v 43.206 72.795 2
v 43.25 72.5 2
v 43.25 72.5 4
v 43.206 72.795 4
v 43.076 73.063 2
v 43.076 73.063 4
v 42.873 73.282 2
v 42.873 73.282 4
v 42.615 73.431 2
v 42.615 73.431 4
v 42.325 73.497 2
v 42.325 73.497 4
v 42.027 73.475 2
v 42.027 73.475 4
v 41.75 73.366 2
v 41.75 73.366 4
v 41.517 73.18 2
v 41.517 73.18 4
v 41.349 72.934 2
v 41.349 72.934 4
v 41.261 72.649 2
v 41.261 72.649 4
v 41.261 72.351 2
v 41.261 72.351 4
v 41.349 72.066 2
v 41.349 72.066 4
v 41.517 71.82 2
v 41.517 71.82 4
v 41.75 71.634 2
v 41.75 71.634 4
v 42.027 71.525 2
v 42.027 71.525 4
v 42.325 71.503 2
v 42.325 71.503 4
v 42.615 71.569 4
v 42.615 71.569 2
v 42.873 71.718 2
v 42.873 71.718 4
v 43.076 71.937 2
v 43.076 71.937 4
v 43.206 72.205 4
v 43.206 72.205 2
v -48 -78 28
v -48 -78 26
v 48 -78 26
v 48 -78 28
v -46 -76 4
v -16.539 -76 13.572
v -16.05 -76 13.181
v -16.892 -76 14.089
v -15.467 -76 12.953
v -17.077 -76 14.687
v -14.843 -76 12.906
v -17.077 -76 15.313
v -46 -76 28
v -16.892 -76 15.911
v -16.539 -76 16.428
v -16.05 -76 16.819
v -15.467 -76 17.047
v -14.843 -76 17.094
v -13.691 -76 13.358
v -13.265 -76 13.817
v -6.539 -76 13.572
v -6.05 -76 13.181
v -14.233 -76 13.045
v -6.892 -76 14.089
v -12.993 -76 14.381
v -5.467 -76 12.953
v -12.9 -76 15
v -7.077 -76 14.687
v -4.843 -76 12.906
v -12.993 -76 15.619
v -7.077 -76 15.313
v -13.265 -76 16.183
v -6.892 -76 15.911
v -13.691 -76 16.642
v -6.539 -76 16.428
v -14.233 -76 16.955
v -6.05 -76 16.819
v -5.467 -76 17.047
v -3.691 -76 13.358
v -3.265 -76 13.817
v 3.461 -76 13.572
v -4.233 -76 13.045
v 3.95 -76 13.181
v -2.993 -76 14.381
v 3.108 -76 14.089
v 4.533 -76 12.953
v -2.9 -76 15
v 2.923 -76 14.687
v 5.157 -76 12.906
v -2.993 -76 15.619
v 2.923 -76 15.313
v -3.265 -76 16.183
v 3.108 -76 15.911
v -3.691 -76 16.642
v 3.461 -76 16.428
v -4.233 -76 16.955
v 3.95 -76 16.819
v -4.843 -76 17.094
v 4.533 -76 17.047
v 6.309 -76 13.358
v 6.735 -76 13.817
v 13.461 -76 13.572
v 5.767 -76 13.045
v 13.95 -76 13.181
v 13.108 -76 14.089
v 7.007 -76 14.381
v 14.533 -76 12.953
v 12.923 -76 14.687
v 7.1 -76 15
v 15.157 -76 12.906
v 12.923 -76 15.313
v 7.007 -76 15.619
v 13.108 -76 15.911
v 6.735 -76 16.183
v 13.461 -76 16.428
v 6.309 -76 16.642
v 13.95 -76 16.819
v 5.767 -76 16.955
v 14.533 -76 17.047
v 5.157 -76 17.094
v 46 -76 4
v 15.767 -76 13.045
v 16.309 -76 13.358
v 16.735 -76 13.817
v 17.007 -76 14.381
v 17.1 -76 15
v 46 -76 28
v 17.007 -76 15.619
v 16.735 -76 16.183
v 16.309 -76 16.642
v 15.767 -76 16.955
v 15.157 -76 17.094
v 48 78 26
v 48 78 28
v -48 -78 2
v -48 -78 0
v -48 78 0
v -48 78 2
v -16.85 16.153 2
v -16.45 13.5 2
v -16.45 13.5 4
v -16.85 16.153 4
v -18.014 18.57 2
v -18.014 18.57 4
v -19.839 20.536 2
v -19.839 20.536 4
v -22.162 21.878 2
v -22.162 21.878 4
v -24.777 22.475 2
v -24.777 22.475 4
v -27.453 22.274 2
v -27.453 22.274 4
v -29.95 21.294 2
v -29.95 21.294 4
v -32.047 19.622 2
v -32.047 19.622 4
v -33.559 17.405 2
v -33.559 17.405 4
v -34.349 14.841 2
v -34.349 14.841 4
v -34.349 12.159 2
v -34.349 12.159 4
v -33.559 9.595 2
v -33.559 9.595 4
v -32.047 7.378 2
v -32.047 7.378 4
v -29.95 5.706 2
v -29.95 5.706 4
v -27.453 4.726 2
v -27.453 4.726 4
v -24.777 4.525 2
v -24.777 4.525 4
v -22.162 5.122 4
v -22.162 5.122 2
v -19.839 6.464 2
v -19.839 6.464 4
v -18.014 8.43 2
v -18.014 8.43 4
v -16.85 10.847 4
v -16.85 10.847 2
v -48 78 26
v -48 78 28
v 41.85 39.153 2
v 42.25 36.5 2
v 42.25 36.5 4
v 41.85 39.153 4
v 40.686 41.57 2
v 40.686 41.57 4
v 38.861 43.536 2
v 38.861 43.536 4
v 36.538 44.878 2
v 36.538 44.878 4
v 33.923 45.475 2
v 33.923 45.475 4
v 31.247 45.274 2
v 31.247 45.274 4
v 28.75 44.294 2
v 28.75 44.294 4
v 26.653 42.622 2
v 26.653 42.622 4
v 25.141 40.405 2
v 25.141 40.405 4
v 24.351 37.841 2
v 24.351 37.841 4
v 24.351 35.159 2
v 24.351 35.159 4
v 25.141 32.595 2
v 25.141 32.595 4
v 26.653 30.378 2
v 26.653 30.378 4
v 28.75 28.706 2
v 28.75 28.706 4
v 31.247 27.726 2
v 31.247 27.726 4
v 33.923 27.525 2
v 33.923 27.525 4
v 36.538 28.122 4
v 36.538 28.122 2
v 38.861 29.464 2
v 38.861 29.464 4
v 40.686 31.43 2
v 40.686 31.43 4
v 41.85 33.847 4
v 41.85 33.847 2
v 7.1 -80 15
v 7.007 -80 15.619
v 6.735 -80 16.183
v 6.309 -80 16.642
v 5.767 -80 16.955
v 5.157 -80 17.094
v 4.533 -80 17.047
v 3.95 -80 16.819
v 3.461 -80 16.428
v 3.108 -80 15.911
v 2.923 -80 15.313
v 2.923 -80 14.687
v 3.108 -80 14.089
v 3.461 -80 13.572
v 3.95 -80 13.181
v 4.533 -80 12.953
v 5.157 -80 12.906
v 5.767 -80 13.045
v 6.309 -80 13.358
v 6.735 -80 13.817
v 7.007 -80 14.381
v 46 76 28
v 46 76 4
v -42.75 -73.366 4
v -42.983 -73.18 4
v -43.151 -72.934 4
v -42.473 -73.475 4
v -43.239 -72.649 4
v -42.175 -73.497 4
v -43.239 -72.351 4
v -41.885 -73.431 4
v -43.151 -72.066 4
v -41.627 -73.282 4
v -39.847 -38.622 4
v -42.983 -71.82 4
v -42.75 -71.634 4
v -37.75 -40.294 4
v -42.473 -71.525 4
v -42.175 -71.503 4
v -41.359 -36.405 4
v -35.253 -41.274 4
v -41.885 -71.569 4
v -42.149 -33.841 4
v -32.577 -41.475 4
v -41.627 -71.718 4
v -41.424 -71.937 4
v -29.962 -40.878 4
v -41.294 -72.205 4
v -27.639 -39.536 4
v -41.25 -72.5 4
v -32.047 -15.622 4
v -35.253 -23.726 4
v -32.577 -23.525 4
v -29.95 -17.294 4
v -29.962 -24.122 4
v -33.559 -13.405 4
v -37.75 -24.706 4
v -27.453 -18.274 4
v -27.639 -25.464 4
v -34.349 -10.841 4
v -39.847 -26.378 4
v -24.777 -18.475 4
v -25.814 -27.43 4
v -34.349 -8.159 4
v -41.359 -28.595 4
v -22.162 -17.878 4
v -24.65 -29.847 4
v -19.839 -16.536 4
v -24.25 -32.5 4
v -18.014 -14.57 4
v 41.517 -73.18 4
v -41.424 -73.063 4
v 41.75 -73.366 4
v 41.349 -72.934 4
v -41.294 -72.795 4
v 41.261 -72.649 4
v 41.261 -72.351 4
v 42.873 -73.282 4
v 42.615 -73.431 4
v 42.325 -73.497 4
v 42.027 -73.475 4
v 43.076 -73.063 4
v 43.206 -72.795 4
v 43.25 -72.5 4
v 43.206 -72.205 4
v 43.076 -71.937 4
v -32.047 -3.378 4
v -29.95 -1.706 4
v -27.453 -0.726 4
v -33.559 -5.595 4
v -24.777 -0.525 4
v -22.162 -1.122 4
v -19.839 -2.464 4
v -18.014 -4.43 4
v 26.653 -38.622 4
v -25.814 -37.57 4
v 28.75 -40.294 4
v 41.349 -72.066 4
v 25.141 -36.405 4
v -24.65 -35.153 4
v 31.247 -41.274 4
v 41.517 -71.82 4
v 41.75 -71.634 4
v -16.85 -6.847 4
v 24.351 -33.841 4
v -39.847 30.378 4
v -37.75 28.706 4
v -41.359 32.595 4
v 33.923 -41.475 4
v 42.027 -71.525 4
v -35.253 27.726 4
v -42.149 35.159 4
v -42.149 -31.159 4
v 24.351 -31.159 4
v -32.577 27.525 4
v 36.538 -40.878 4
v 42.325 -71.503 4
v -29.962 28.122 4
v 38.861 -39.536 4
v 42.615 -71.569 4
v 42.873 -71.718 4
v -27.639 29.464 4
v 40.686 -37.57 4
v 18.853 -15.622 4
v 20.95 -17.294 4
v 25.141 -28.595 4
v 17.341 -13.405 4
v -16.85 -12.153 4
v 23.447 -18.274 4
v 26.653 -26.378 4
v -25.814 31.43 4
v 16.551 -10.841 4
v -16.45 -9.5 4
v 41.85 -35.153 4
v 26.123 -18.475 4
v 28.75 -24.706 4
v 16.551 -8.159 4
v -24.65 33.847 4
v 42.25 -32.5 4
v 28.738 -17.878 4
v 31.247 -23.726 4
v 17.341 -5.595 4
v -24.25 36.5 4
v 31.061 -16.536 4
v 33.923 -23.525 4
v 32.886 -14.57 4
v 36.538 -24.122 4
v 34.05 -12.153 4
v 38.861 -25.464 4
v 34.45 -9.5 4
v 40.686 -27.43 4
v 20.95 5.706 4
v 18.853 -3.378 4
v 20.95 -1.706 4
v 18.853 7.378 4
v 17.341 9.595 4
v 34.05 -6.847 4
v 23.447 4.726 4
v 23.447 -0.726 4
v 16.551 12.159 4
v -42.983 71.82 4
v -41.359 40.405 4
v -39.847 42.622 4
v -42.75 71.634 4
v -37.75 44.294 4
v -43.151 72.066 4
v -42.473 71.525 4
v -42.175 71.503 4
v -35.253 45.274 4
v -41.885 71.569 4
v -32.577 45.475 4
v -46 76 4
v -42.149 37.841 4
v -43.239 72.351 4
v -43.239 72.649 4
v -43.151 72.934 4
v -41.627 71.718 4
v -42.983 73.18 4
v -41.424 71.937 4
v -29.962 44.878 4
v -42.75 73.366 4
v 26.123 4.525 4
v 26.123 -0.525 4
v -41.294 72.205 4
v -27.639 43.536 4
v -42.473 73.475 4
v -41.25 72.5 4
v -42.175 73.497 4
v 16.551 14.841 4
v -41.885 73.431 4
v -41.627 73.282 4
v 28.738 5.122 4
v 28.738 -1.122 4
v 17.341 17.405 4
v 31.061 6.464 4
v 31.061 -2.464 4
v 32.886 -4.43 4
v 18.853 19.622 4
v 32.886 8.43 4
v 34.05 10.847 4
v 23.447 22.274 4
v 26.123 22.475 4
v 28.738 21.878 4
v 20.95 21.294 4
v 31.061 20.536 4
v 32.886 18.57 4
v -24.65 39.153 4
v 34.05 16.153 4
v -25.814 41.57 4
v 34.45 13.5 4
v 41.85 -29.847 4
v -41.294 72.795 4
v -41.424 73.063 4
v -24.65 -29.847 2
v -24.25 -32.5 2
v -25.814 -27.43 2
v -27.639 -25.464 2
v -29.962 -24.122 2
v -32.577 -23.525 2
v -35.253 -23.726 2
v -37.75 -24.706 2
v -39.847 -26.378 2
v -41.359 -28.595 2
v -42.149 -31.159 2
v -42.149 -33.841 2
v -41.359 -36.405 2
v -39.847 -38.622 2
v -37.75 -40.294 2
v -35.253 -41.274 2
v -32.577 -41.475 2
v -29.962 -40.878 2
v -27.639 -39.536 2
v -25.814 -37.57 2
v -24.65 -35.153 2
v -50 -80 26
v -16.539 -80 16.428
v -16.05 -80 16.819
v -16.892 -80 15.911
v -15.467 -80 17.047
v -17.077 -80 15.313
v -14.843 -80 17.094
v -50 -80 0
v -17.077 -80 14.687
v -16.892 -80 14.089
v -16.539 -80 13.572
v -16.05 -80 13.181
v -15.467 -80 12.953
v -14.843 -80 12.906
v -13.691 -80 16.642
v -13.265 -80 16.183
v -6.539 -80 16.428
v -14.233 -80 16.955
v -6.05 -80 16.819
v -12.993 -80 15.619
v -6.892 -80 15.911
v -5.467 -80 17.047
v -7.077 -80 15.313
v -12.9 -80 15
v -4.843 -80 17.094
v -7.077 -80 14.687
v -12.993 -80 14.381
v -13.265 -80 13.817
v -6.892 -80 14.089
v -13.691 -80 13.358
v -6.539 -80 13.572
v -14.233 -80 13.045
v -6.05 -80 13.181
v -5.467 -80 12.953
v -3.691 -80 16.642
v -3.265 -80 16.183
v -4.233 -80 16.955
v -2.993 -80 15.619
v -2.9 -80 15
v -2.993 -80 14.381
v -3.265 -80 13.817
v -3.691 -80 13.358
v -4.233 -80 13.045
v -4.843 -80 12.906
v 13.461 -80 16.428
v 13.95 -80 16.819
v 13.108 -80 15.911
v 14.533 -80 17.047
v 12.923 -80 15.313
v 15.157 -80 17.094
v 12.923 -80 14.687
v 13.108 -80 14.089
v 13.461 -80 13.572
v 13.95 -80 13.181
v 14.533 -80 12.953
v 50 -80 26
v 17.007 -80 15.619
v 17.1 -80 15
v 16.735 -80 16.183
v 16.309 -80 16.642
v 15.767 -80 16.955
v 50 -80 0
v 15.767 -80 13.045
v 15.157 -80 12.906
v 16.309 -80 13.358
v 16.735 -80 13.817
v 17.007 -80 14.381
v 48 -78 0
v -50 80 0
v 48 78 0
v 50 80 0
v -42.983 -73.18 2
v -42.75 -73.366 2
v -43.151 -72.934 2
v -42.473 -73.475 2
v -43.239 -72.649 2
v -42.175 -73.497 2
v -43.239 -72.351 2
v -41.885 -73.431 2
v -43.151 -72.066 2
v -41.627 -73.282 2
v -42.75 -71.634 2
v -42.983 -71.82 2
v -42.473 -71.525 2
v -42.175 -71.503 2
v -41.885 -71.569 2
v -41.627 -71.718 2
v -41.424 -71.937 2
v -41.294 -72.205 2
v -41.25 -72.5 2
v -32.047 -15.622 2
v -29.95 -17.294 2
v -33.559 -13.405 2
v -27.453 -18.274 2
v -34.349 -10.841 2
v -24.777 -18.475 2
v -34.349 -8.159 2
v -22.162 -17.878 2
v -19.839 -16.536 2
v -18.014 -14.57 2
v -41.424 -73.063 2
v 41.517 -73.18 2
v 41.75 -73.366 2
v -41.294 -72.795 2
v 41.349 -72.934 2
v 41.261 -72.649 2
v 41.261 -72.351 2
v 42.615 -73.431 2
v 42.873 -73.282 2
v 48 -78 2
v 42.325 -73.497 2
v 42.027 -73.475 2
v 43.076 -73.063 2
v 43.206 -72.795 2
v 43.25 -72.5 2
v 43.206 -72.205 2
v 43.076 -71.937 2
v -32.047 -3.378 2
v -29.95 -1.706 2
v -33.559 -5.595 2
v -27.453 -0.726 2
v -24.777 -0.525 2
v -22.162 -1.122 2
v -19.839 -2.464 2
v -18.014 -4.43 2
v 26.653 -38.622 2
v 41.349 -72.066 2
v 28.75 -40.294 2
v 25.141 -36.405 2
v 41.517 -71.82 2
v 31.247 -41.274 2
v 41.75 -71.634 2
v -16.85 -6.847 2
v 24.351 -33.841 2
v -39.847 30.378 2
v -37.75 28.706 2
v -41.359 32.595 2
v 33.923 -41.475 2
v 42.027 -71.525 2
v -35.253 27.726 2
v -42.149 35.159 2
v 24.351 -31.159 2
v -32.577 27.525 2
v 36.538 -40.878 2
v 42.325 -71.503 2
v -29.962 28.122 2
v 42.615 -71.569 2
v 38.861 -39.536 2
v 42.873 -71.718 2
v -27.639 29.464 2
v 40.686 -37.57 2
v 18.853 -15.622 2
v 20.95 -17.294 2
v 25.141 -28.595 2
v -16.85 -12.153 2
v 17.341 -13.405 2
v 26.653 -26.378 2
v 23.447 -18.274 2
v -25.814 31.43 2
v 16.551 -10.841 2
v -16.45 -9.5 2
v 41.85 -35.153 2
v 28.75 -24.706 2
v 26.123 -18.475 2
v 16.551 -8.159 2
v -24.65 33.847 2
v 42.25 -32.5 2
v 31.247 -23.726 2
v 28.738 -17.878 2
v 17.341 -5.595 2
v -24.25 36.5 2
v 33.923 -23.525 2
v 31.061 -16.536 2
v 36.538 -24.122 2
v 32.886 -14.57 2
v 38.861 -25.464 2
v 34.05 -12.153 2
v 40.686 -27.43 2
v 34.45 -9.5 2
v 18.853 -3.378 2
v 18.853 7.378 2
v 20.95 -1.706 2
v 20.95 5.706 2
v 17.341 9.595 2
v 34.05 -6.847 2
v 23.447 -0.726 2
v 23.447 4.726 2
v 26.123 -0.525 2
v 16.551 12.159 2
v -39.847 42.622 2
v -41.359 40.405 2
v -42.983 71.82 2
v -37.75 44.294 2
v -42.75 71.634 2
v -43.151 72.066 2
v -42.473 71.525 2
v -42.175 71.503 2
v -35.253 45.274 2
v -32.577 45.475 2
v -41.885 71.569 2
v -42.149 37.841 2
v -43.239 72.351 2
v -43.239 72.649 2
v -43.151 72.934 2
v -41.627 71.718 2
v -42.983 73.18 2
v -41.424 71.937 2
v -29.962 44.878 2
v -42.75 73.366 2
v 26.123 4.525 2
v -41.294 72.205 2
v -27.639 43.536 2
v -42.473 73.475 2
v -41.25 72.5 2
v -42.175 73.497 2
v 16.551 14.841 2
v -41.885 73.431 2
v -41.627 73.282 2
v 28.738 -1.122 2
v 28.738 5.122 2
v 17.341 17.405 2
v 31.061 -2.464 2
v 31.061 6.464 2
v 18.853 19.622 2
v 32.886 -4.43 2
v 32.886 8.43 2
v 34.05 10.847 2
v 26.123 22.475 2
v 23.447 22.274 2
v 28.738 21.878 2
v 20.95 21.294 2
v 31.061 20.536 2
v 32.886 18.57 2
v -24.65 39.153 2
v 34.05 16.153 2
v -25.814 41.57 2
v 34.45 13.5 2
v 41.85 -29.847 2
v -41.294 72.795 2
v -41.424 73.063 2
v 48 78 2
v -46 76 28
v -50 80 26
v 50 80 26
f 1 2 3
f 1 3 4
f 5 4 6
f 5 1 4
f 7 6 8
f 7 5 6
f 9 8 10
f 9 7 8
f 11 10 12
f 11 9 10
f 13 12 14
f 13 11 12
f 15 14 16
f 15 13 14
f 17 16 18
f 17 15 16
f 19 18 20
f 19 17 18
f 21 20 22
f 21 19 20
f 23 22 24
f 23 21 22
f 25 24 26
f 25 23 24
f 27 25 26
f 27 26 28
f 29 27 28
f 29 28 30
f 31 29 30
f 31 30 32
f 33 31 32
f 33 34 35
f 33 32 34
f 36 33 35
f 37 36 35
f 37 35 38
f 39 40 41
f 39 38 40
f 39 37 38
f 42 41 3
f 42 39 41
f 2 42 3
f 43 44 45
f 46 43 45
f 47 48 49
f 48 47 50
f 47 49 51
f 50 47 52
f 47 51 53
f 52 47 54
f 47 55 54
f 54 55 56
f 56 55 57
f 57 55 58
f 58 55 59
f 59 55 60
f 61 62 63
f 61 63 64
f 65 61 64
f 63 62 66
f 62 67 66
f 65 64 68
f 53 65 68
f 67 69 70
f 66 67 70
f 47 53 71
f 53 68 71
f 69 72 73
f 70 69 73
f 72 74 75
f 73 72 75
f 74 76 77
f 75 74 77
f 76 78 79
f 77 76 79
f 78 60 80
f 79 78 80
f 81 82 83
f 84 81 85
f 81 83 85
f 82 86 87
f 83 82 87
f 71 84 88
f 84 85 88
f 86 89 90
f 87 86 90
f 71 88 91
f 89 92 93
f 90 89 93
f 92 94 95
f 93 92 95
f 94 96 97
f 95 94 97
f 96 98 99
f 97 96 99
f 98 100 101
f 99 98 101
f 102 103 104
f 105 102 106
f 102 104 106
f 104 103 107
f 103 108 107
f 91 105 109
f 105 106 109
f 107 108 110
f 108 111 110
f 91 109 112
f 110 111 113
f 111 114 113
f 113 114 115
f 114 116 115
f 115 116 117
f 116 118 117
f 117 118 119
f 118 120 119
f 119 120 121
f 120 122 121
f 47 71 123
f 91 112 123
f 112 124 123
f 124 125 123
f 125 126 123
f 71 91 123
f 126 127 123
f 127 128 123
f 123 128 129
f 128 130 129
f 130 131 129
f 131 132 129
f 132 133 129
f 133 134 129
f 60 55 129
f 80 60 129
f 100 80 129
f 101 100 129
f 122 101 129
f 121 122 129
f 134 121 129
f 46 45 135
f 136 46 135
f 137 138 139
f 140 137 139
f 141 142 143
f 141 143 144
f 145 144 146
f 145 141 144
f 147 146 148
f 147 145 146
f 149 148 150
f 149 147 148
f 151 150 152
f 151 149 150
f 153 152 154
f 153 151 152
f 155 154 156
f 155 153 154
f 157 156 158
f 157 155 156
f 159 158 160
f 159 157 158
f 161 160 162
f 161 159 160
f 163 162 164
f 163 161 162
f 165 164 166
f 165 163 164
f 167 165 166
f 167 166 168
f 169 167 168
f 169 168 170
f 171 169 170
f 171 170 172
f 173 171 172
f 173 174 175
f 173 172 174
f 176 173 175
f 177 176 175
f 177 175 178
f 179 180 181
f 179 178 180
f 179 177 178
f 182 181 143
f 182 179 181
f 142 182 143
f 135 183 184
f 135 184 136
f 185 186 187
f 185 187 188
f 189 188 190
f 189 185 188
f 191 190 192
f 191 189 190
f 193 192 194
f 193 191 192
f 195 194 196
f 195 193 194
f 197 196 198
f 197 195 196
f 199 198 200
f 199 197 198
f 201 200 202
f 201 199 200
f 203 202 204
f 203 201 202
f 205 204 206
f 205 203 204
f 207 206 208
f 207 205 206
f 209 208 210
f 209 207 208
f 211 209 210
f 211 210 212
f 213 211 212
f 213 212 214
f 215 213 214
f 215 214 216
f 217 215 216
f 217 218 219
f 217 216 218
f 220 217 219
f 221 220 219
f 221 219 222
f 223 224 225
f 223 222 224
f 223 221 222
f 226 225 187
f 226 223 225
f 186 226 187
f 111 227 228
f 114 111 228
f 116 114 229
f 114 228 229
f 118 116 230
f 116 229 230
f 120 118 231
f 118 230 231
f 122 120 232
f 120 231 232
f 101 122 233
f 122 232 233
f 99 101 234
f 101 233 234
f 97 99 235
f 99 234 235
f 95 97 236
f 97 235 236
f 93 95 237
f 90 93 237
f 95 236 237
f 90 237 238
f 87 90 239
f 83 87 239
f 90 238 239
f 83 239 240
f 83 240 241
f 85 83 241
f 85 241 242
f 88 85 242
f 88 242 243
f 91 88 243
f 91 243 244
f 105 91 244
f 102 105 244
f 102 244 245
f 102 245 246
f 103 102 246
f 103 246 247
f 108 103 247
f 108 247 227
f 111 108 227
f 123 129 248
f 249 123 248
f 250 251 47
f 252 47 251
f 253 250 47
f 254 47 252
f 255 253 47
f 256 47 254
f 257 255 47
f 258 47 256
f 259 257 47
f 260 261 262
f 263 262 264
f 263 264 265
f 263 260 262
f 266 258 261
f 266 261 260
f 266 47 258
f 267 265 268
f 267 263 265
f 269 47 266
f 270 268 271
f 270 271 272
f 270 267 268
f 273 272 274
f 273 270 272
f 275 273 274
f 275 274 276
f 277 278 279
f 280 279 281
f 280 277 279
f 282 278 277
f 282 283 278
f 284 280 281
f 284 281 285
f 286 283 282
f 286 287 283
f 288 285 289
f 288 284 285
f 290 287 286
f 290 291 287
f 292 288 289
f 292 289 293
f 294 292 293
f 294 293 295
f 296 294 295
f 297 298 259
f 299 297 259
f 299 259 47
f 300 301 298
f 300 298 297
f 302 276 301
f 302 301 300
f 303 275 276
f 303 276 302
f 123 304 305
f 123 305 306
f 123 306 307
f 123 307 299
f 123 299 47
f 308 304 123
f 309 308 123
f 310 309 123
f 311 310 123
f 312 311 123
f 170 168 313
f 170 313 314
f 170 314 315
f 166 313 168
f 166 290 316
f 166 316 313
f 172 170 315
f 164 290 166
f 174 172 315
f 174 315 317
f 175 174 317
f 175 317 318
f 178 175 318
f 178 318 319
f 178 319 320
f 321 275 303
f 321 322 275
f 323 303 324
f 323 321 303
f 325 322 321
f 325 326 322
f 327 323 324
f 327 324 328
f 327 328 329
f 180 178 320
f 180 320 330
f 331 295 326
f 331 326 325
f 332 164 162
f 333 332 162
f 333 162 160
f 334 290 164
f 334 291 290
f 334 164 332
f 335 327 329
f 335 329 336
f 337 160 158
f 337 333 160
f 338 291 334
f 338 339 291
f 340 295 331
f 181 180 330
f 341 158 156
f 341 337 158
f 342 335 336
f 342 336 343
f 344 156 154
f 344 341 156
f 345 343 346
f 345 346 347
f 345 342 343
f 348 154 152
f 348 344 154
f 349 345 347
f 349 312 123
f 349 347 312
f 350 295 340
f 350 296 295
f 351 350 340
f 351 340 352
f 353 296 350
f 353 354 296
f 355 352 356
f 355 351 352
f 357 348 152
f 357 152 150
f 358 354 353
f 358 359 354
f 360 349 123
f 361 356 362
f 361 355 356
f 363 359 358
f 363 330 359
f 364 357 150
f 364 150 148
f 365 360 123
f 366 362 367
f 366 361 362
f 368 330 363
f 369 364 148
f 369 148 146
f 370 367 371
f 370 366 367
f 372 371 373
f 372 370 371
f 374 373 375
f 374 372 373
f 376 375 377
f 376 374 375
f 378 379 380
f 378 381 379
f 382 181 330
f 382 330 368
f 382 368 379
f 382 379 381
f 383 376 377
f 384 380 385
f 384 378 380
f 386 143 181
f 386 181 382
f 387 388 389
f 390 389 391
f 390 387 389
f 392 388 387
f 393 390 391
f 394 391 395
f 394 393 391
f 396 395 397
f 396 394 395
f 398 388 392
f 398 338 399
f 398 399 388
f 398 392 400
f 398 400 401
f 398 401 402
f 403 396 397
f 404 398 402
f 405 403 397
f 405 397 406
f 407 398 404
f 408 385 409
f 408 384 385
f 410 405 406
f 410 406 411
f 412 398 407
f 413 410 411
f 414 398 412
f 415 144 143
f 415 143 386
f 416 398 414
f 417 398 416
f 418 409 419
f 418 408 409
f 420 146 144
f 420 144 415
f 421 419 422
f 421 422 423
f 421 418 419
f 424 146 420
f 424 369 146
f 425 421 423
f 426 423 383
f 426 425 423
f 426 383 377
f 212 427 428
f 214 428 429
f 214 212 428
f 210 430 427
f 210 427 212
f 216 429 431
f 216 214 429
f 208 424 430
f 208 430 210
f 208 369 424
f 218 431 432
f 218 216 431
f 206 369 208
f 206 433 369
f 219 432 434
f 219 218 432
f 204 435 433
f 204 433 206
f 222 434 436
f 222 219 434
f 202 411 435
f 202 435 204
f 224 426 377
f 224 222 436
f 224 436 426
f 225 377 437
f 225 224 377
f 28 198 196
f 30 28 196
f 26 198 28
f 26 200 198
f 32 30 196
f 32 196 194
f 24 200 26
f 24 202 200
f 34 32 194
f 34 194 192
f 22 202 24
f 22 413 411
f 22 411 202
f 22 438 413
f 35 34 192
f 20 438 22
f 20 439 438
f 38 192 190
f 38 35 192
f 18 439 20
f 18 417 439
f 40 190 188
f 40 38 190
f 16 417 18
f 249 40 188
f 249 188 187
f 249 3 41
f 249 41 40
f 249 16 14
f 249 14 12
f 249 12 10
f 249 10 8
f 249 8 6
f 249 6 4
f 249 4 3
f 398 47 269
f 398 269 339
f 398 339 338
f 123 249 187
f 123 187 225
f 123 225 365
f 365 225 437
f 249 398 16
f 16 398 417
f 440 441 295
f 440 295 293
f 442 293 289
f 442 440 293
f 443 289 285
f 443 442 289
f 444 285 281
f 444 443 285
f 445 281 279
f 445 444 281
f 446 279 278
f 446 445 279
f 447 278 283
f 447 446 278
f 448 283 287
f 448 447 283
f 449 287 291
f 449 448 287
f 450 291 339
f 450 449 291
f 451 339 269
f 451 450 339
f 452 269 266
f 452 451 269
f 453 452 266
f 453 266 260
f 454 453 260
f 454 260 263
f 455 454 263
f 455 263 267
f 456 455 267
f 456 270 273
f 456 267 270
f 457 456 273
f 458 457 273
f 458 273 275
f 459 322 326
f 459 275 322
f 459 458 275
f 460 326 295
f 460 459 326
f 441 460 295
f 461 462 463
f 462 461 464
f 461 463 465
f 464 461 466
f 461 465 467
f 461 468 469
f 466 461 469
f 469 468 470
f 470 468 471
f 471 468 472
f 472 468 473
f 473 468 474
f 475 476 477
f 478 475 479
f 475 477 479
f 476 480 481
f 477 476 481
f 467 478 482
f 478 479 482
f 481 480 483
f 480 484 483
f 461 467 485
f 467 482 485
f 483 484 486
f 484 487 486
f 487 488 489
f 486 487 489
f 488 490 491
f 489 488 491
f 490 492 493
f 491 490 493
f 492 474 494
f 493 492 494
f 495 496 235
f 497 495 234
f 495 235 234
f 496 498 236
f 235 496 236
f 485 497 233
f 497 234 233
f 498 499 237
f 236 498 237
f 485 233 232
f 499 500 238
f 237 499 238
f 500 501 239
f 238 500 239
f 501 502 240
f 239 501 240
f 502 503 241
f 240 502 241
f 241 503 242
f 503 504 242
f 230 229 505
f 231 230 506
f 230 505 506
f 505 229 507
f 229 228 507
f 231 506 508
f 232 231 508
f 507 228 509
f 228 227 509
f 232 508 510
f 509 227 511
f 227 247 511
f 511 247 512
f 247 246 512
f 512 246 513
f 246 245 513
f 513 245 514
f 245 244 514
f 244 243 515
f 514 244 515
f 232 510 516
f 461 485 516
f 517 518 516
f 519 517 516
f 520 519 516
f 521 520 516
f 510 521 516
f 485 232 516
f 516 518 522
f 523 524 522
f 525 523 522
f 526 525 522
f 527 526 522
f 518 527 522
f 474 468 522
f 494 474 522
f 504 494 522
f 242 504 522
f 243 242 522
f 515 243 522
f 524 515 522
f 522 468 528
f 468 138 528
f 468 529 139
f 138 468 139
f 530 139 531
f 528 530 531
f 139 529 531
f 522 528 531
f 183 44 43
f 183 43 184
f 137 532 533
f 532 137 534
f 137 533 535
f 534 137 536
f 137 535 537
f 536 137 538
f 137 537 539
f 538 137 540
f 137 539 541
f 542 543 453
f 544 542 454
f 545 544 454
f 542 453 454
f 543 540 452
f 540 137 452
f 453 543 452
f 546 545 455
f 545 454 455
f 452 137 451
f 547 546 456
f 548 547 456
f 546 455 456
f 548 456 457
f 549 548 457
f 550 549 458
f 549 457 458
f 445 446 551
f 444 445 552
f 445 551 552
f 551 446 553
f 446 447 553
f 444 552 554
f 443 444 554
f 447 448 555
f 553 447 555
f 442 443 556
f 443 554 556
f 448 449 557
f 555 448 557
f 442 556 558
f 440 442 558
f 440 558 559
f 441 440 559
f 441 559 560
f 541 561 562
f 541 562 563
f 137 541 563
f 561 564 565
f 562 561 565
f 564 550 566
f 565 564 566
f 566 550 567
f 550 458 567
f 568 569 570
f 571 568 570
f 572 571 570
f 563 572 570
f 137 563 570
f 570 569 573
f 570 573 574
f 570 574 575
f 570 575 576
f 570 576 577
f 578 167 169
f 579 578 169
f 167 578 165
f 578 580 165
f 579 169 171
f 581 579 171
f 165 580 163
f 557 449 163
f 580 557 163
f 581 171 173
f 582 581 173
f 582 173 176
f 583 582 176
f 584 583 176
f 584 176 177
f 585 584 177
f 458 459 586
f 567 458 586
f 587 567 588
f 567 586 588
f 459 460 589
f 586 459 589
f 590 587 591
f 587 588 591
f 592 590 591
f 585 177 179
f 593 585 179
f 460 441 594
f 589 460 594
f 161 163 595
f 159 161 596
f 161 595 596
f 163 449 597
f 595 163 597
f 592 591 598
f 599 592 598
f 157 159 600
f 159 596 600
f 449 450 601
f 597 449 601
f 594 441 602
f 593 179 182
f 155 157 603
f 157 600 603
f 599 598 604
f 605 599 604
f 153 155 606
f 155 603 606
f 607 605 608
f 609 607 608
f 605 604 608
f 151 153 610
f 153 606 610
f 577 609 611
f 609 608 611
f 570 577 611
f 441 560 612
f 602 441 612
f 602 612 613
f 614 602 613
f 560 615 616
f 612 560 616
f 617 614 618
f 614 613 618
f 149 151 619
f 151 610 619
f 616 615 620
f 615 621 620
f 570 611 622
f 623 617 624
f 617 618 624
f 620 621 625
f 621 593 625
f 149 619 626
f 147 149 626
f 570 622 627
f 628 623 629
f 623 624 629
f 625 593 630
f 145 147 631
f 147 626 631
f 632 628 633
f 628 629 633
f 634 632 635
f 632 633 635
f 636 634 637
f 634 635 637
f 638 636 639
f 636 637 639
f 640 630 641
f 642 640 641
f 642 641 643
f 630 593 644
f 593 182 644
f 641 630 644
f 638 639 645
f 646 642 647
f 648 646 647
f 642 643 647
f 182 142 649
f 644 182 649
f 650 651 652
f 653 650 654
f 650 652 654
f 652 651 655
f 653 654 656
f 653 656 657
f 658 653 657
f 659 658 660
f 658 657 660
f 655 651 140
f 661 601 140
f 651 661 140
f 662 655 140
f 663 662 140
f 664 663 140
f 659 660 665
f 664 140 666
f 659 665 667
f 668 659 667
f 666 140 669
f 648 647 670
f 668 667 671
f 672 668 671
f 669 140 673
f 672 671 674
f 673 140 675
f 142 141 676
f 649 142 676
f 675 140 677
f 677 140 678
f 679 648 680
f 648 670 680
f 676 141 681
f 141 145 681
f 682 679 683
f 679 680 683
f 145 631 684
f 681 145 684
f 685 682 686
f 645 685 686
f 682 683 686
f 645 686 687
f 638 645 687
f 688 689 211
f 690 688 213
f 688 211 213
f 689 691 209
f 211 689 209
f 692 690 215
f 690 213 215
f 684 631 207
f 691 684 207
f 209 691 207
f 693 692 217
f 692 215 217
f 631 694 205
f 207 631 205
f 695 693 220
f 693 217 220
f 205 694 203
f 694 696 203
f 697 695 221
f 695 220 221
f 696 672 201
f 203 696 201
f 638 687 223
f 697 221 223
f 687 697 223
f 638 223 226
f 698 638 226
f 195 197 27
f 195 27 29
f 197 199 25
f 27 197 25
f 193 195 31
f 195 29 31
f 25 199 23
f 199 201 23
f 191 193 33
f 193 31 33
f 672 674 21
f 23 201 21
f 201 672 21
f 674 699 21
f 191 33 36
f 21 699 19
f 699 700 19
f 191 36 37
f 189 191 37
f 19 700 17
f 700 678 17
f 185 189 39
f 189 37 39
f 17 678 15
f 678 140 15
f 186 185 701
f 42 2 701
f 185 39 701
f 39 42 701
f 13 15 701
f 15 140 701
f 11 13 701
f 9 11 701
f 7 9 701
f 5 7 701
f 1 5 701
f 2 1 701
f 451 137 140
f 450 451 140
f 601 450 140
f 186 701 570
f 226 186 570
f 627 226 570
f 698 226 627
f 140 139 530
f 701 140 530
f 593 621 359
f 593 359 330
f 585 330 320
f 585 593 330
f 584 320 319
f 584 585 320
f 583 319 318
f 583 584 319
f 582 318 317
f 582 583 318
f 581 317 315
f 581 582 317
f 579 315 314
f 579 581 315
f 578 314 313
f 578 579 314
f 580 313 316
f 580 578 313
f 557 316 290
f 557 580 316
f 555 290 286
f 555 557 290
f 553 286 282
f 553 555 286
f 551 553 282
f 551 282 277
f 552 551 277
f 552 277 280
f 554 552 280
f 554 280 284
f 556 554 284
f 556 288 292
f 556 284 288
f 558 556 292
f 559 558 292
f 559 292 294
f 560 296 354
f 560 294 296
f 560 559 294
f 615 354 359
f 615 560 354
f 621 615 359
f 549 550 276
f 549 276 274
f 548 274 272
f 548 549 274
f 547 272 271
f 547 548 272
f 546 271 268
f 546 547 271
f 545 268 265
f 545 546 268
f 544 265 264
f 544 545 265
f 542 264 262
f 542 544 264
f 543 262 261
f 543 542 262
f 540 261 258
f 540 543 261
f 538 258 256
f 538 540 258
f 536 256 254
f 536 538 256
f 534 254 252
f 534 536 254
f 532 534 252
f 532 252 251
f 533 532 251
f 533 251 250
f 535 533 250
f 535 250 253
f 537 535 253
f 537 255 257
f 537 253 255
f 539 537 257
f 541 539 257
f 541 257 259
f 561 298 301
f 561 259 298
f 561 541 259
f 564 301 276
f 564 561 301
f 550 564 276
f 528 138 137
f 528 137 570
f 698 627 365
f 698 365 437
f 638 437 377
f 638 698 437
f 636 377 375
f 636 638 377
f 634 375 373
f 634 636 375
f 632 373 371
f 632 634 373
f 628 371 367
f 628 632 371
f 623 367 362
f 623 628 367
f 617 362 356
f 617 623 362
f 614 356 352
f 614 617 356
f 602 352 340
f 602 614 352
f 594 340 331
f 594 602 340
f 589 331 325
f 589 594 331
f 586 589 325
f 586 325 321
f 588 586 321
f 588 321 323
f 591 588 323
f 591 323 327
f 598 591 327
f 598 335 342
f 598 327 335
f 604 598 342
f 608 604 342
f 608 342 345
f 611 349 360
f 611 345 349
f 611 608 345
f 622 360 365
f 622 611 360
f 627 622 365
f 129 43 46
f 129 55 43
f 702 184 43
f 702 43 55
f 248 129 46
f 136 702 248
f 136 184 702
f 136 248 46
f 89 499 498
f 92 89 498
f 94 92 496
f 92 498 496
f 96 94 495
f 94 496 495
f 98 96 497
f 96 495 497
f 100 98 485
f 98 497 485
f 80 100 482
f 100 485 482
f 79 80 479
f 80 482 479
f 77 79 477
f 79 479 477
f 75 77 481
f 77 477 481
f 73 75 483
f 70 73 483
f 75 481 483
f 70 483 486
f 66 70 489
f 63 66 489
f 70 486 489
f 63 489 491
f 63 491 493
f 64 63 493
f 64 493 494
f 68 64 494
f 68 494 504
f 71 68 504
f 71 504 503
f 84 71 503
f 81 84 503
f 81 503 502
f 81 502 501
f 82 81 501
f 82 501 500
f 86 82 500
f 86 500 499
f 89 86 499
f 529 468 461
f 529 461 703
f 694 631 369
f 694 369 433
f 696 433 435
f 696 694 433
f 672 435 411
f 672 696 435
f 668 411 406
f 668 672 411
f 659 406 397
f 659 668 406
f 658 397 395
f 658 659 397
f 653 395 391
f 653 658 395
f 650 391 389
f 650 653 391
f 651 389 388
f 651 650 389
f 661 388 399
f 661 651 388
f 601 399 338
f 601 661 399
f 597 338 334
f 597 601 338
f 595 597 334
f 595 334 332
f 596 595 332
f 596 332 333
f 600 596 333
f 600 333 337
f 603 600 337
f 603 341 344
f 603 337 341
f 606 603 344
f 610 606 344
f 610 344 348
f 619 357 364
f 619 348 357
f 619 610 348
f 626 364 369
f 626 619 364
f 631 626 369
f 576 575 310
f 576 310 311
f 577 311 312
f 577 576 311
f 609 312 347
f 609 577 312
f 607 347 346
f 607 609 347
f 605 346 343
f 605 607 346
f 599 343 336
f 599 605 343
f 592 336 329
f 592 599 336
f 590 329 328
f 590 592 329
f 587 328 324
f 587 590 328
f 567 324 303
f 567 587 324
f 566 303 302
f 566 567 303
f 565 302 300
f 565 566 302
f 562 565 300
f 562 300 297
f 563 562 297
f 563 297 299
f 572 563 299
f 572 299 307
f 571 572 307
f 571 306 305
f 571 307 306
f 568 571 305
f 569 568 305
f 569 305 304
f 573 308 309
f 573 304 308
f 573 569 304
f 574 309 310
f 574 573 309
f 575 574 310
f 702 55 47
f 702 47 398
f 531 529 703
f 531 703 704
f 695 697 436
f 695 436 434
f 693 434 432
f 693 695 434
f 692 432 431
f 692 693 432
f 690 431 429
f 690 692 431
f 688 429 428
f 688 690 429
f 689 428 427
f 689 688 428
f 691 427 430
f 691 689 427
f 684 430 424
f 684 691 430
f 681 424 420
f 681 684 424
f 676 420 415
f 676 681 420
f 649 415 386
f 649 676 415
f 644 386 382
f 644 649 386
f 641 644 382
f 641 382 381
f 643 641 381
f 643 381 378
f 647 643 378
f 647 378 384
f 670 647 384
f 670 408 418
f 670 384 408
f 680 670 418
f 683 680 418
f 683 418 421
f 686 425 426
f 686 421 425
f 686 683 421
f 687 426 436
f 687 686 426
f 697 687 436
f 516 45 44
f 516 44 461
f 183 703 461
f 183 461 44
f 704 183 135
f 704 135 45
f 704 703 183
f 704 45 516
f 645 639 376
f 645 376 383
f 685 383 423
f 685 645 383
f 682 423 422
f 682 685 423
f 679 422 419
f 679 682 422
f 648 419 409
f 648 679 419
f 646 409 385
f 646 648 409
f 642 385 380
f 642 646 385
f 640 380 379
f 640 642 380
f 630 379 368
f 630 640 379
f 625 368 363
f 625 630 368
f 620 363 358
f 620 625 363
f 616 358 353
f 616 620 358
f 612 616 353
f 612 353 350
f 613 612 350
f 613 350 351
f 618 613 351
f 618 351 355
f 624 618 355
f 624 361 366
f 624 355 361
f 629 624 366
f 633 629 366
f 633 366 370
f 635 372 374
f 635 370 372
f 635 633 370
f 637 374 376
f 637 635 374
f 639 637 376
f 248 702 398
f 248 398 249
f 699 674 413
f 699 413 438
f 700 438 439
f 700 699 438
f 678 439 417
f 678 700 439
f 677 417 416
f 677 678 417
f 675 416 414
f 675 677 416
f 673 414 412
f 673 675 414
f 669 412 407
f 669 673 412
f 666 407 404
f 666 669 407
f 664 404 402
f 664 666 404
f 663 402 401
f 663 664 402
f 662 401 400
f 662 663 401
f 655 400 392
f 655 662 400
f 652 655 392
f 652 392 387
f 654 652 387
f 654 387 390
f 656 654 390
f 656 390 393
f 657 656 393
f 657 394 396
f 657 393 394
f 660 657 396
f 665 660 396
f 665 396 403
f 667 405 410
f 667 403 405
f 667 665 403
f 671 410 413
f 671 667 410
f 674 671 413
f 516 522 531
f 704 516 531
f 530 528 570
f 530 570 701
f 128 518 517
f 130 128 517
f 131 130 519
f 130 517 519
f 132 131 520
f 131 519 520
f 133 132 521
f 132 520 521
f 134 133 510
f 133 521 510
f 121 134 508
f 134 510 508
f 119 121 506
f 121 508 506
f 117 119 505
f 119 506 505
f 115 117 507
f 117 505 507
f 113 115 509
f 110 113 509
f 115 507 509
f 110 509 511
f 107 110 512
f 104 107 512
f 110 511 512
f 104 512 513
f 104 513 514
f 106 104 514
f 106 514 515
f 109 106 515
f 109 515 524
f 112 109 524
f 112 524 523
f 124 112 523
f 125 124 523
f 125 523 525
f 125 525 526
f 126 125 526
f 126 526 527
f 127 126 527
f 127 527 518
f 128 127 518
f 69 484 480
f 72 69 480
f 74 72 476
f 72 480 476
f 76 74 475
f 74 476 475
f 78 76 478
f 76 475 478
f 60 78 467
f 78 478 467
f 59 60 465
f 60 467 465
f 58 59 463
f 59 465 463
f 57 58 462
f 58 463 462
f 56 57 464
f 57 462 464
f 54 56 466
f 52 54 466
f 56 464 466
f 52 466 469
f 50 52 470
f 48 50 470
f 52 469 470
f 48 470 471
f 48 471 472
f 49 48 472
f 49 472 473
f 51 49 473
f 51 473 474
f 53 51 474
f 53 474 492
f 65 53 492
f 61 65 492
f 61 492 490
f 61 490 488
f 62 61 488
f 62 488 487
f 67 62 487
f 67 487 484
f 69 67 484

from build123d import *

# Parameters (mm, degrees)
SKETCH_W        = 100
SKETCH_H        = 160
PAD_DEPTH       = 26
SKETCH001_W     = 96
SKETCH001_H     = 156
PAD001_DEPTH    = 28
SKETCH005_W     = 92
SKETCH005_H     = 152
POCKET_DEPTH    = 24
SKETCH003_R     = 9
POCKET001_DEPTH = 28.001
SKETCH002_R     = 1
POCKET002_DEPTH = 28.001
SKETCH006_W     = 96
SKETCH006_H     = 156
POCKET003_DEPTH = 2
SKETCH007_R     = 2.1
POCKET004_DEPTH = 10


with BuildPart() as part:
    # Sketch → Pad (new body)
    with BuildSketch(Plane.XY):
        Rectangle(SKETCH_W, SKETCH_H)
    extrude(amount=PAD_DEPTH)

    # Sketch001 → Pad001 (join)
    with BuildSketch(Plane.XY):
        Rectangle(SKETCH001_W, SKETCH001_H)
    extrude(amount=PAD001_DEPTH)

    # Sketch005 → Pocket (cut)
    with BuildSketch(Plane.XY.offset(28)):
        Rectangle(SKETCH005_W, SKETCH005_H)
    extrude(amount=-POCKET_DEPTH, mode=Mode.SUBTRACT)

    # Sketch003 → Pocket001 (cut, through all)
    with BuildSketch(Plane.XY):
        with Locations((33.25, 36.5)):
            Circle(SKETCH003_R)
        with Locations((25.45, 13.5)):
            Circle(SKETCH003_R)
        with Locations((25.45, -9.5)):
            Circle(SKETCH003_R)
        with Locations((33.25, -32.5)):
            Circle(SKETCH003_R)
        with Locations((-33.25, 36.5)):
            Circle(SKETCH003_R)
        with Locations((-25.45, 13.5)):
            Circle(SKETCH003_R)
        with Locations((-25.45, -9.5)):
            Circle(SKETCH003_R)
        with Locations((-33.25, -32.5)):
            Circle(SKETCH003_R)
    extrude(amount=POCKET001_DEPTH, mode=Mode.SUBTRACT)

    # Sketch002 → Pocket002 (cut, through all)
    with BuildSketch(Plane.XY):
        with Locations((42.25, 72.5)):
            Circle(SKETCH002_R)
        with Locations((-42.25, 72.5)):
            Circle(SKETCH002_R)
        with Locations((42.25, -72.5)):
            Circle(SKETCH002_R)
        with Locations((-42.25, -72.5)):
            Circle(SKETCH002_R)
    extrude(amount=POCKET002_DEPTH, mode=Mode.SUBTRACT)

    # Sketch006 → Pocket003 (cut)
    with BuildSketch(Plane.XY):
        Rectangle(SKETCH006_W, SKETCH006_H)
    extrude(amount=POCKET003_DEPTH, mode=Mode.SUBTRACT)

    # Sketch007 → Pocket004 (cut)
    with BuildSketch(Plane.XZ.offset(80)):
        with Locations((-15, 15)):
            Circle(SKETCH007_R)
        with Locations((-5, 15)):
            Circle(SKETCH007_R)
        with Locations((5, 15)):
            Circle(SKETCH007_R)
        with Locations((15, 15)):
            Circle(SKETCH007_R)
    extrude(amount=-POCKET004_DEPTH, mode=Mode.SUBTRACT)


solid = part.part
